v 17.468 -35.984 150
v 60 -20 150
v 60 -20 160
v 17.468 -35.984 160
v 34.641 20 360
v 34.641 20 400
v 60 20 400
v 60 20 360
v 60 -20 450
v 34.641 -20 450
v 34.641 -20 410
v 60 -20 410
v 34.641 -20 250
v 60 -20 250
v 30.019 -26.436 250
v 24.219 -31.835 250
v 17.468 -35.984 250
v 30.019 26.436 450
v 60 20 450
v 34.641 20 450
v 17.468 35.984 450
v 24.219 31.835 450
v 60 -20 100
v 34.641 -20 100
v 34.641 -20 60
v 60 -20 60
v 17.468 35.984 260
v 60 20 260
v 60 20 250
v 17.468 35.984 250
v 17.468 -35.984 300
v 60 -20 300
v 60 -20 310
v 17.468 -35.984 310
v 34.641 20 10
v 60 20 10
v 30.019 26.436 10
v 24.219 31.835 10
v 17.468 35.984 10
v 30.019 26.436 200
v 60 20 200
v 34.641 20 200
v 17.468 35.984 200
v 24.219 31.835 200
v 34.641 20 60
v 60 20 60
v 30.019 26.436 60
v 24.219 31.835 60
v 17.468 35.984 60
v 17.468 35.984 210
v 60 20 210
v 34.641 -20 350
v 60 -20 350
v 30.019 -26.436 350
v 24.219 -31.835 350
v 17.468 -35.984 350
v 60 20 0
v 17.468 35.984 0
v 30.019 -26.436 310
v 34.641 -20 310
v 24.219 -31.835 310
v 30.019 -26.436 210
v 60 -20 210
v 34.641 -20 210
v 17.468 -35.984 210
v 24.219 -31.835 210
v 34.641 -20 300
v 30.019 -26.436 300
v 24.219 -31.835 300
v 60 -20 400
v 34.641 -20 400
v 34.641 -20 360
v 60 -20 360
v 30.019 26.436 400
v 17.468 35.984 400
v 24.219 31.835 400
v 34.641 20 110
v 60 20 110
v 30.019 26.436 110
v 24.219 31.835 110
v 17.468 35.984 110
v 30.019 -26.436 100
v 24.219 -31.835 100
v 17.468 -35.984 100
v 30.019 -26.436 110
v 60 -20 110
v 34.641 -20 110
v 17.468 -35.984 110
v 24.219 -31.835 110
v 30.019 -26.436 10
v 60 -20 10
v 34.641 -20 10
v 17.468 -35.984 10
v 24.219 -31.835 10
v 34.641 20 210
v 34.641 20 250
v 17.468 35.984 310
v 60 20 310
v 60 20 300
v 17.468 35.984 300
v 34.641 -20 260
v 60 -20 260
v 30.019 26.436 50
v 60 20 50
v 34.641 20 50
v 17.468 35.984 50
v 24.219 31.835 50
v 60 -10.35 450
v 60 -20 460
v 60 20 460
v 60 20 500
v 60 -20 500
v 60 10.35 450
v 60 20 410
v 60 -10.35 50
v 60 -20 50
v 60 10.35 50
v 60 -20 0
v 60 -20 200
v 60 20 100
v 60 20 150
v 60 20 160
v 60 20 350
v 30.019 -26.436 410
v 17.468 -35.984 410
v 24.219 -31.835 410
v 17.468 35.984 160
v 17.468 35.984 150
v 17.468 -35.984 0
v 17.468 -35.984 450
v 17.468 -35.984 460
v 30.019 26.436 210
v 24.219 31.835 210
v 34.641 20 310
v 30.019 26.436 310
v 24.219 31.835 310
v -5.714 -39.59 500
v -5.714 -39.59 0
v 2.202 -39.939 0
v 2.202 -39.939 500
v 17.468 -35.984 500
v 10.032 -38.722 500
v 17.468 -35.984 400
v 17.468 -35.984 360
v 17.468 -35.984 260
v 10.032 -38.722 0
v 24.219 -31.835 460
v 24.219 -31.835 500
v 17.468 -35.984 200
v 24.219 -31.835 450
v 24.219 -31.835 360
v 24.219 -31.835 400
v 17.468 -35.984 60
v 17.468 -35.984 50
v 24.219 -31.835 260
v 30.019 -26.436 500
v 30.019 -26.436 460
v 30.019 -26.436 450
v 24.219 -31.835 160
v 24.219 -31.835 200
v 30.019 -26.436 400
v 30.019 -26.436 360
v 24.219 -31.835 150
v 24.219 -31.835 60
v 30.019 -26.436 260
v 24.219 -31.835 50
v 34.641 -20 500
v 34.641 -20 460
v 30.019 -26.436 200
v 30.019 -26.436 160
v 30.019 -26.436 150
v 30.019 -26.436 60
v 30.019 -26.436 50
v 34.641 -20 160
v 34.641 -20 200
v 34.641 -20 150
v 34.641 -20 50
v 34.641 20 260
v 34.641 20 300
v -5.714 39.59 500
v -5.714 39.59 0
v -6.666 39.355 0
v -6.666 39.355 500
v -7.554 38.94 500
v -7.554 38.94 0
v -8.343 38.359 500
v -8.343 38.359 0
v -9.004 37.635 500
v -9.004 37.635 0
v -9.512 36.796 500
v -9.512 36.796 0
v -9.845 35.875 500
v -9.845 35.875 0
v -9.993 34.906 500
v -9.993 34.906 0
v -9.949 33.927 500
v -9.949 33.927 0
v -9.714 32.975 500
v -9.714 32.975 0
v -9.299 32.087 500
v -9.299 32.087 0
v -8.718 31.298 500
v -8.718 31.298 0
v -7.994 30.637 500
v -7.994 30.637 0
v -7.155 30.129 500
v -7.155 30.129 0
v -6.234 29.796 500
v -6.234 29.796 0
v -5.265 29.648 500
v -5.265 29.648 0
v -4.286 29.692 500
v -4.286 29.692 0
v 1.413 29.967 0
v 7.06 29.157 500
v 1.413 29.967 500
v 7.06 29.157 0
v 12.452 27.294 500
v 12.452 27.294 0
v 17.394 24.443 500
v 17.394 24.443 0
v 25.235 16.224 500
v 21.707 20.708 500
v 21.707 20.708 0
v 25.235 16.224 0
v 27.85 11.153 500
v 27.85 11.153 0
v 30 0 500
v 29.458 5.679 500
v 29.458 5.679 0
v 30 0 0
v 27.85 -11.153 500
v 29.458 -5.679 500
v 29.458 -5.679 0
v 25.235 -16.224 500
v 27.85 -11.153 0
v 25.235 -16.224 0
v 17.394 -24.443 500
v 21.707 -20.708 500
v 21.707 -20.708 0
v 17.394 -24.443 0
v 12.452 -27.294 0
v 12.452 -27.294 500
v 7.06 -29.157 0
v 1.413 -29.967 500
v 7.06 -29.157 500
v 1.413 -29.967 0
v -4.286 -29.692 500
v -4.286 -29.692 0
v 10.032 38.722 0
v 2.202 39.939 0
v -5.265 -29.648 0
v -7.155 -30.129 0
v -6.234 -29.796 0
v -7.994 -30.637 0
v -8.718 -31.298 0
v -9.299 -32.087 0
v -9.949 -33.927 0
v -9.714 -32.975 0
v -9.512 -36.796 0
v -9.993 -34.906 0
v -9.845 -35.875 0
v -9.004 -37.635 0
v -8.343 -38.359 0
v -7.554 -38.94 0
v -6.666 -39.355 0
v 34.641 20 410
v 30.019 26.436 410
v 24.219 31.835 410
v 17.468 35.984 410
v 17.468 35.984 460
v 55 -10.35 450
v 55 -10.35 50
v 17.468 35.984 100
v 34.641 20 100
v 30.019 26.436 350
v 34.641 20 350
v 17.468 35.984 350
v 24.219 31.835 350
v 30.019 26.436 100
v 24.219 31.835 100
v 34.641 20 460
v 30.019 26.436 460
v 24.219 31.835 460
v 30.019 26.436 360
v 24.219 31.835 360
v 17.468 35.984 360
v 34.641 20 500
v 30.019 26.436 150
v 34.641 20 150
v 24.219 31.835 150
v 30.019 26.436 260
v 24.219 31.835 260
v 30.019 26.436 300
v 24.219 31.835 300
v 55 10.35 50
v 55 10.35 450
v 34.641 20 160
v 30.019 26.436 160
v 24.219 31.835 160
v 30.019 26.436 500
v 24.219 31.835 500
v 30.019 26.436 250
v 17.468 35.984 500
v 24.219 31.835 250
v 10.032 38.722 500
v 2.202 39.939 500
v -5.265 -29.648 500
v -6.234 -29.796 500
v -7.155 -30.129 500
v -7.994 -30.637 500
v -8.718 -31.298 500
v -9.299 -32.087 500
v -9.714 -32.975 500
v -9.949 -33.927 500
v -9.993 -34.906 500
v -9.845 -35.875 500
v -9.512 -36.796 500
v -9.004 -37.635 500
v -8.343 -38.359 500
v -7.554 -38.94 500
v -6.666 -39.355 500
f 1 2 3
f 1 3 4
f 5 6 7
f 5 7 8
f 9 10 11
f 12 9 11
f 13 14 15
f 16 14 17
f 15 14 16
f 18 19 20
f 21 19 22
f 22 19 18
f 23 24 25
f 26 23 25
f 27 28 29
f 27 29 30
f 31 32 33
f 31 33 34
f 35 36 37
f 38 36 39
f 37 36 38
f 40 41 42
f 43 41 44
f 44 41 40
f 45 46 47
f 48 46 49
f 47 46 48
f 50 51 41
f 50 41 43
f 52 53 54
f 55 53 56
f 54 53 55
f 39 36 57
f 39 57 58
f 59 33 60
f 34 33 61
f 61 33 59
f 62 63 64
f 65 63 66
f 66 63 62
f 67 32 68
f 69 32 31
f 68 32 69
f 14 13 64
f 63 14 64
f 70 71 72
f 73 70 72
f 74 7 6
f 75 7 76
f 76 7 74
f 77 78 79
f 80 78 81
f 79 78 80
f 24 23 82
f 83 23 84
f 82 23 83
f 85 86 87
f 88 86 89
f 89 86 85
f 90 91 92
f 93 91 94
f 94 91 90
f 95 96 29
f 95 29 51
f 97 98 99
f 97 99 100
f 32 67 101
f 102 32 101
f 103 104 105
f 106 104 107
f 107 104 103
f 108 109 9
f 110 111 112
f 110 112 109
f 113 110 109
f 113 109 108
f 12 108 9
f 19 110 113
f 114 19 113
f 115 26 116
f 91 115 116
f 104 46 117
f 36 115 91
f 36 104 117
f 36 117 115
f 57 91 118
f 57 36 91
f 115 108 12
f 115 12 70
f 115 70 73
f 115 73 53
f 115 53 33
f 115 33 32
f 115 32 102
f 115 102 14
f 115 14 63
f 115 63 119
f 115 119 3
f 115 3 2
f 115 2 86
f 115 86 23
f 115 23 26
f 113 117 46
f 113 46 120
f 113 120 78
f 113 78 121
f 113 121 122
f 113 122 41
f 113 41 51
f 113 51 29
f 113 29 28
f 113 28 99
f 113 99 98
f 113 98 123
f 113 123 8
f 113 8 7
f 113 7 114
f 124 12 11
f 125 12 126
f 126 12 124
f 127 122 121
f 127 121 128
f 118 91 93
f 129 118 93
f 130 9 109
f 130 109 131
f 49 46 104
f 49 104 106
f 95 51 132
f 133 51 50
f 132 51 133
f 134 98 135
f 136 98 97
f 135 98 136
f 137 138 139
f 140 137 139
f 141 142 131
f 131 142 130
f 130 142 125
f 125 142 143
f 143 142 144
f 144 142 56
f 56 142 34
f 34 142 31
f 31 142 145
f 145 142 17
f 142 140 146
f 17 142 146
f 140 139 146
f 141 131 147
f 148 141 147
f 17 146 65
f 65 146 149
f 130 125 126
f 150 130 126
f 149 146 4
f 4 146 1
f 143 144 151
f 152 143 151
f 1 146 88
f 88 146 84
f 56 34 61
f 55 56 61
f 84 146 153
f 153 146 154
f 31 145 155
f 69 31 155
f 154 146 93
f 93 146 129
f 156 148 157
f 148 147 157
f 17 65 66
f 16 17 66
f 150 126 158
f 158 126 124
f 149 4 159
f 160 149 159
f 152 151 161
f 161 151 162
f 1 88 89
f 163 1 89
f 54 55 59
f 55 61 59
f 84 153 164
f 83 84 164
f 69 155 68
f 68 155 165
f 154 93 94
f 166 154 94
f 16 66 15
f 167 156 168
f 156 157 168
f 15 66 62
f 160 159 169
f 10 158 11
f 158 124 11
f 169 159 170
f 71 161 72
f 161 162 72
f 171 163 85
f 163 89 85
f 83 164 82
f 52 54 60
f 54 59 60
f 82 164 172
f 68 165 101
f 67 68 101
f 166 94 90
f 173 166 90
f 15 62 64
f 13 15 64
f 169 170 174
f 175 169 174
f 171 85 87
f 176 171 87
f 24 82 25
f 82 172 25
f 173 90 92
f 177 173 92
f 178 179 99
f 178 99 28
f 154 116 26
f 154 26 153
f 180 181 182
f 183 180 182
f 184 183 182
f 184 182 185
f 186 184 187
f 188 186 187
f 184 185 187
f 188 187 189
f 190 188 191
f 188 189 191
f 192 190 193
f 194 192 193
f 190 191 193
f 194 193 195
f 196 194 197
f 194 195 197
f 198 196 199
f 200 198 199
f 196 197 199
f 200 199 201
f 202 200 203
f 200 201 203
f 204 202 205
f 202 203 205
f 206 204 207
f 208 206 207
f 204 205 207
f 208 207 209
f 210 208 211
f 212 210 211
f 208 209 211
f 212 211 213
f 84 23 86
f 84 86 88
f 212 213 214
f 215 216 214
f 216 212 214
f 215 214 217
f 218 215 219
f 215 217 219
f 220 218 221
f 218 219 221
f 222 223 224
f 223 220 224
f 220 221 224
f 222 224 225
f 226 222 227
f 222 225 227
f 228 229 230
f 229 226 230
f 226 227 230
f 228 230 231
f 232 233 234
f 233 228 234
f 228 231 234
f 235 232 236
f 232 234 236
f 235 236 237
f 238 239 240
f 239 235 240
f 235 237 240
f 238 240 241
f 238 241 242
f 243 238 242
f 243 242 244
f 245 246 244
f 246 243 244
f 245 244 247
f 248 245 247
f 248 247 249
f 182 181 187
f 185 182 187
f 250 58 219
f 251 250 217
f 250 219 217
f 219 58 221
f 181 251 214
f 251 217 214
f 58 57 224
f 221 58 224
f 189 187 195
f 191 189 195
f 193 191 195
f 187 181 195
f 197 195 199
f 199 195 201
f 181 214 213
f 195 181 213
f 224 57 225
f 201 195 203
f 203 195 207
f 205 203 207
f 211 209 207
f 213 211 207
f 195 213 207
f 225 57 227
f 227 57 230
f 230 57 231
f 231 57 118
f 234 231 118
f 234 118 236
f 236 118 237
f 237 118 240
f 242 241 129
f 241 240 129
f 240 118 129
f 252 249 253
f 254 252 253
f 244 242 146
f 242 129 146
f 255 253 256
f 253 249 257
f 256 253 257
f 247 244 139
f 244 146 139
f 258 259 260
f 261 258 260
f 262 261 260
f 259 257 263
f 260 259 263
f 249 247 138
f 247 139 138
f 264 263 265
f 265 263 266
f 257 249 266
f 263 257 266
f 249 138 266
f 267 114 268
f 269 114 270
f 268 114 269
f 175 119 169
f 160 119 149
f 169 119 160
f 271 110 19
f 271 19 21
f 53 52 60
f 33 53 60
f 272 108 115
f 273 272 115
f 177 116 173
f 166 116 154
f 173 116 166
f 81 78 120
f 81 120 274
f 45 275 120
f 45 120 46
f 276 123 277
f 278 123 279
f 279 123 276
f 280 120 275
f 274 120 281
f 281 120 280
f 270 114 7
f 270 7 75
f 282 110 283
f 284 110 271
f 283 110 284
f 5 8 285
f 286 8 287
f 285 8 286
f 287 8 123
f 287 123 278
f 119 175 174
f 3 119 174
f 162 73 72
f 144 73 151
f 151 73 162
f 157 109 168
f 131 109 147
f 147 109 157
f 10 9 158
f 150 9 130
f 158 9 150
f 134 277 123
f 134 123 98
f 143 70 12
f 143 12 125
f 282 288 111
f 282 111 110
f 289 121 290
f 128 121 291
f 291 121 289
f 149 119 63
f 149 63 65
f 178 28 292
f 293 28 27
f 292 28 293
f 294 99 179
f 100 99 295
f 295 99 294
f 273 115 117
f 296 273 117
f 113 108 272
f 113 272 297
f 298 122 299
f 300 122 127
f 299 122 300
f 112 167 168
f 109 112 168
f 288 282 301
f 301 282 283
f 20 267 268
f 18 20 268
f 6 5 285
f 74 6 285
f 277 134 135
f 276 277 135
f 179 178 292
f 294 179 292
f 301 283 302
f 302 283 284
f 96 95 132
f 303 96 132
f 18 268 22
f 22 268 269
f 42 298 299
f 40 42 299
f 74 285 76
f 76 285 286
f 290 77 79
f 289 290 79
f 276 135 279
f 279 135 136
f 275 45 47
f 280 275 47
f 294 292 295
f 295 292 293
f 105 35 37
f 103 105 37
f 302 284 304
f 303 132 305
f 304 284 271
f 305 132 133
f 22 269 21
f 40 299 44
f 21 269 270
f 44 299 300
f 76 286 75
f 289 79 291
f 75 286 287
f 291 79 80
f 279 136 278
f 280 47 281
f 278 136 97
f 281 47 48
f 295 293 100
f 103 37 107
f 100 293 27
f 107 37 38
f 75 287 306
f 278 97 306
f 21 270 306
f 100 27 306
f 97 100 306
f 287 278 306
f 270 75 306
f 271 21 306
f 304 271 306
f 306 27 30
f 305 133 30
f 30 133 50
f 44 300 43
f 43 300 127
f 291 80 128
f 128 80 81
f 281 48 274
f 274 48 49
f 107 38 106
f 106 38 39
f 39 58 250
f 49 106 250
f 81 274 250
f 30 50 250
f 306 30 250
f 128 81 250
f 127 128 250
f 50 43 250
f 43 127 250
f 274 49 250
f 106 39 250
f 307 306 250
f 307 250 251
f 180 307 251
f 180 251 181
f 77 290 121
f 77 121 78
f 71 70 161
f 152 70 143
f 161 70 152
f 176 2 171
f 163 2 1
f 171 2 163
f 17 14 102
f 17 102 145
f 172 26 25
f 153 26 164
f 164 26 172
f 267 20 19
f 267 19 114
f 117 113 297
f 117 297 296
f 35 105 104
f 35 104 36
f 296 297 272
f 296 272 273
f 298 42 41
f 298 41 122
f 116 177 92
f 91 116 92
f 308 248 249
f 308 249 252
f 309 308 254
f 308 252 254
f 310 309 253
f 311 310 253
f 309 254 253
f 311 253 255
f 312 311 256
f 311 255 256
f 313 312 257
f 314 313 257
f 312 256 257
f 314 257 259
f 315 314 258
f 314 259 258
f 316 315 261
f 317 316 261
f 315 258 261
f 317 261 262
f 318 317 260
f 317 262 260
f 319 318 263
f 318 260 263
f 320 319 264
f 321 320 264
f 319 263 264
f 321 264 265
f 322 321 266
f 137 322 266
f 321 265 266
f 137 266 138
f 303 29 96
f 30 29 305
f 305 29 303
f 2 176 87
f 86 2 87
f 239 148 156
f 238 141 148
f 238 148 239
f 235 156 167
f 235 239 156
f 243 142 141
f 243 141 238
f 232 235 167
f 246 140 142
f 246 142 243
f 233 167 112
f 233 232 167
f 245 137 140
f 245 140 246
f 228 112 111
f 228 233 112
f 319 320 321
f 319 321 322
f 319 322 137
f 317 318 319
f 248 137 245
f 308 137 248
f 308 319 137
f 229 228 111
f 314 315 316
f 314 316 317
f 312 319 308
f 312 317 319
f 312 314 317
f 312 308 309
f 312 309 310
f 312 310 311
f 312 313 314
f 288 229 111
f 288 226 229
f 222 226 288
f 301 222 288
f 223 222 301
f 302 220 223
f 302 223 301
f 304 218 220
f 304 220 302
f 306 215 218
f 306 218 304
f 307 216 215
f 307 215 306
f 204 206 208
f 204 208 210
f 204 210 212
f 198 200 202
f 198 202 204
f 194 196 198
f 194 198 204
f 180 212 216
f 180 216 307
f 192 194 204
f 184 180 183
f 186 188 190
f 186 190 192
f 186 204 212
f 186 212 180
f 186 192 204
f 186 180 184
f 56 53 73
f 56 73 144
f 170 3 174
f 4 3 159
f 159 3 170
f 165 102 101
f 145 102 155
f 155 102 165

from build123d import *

# Parameters (mm, degrees)
BOSS_EXTRUDE1_DEPTH     = 500
BOSS_EXTRUDE2_START     = 30
SKETCH2_W               = 500
SKETCH2_H               = 40
BOSS_EXTRUDE2_DEPTH     = 30
RIB1_REACH              = 507.173
SKETCH4_WALL_W          = 1057.782982674
SKETCH4_WALL_H          = 10
LPATTERN1_COUNT         = 10
LPATTERN1_PITCH         = 50
MIRROR1_COPY_1_REACH    = 507.173
MIRROR1_COPY_1_SKETCH_W = 1057.782982674
MIRROR1_COPY_1_SKETCH_H = 10
MIRROR1_COPY_2_REACH    = 507.173
MIRROR1_COPY_2_SKETCH_W = 1057.782982674
MIRROR1_COPY_2_SKETCH_H = 10
MIRROR1_COPY_3_REACH    = 507.173
MIRROR1_COPY_3_SKETCH_W = 1057.782982674
MIRROR1_COPY_3_SKETCH_H = 10
MIRROR1_COPY_4_REACH    = 507.173
MIRROR1_COPY_4_SKETCH_W = 1057.782982674
MIRROR1_COPY_4_SKETCH_H = 10
MIRROR1_COPY_5_REACH    = 507.173
MIRROR1_COPY_5_SKETCH_W = 1057.782982674
MIRROR1_COPY_5_SKETCH_H = 10
MIRROR1_COPY_6_REACH    = 507.173
MIRROR1_COPY_6_SKETCH_W = 1057.782982674
MIRROR1_COPY_6_SKETCH_H = 10
MIRROR1_COPY_7_REACH    = 507.173
MIRROR1_COPY_7_SKETCH_W = 1057.782982674
MIRROR1_COPY_7_SKETCH_H = 10
MIRROR1_COPY_8_REACH    = 507.173
MIRROR1_COPY_8_SKETCH_W = 1057.782982674
MIRROR1_COPY_8_SKETCH_H = 10
MIRROR1_COPY_9_REACH    = 507.173
MIRROR1_COPY_9_SKETCH_W = 1057.782982674
MIRROR1_COPY_9_SKETCH_H = 10
SKETCH5_W               = 400
SKETCH5_H               = 20.700317686
CUT_EXTRUDE1_DEPTH      = 5


with BuildPart() as part:
    # Sketch1 → Boss-Extrude1 (new body)
    with BuildSketch(Plane.XY):
        with BuildLine():
            ThreePointArc((-5.714285714, 39.589732744), (-9.948716593, 33.926730437), (-4.285714286, 29.692299558))
            ThreePointArc((-4.285714286, 29.692299558), (30, 0), (-4.285714286, -29.692299558))
            ThreePointArc((-4.285714286, -29.692299558), (-9.948716593, -33.926730437), (-5.714285714, -39.589732744))
            ThreePointArc((-5.714285714, -39.589732744), (40, 0), (-5.714285714, 39.589732744))
        make_face()
    extrude(amount=BOSS_EXTRUDE1_DEPTH)

    # Sketch2 → Boss-Extrude2 (add)
    with BuildSketch(Plane(origin=(0, 0, 0), x_dir=(0, 0, -1), z_dir=(1, 0, 0)).offset(BOSS_EXTRUDE2_START)):
        with Locations((-250, 0)):
            Rectangle(SKETCH2_W, SKETCH2_H)
    extrude(amount=BOSS_EXTRUDE2_DEPTH)

    # Sketch4 wall → Rib1 (add, up to next)
    with BuildSketch(Plane(origin=(38.733961597, 27.992162595, 0), x_dir=(-0.936077158958, 0.351794759025, 0), z_dir=(0.351794759025, 0.936077158958, 0)), mode=Mode.PRIVATE) as rib1_sk1:
        with Locations((0, 5)):
            Rectangle(SKETCH4_WALL_W, SKETCH4_WALL_H)
    rib1_tool1 = extrude(rib1_sk1.sketch, amount=-RIB1_REACH, mode=Mode.PRIVATE) - part.part
    rib1 = rib1_tool1.solids().sort_by_distance((38.733961597, 27.992162595, 0))[0]
    add(rib1)

    # LPattern1: Rib1 ×10
    with Locations(*[(0, 0, i * LPATTERN1_PITCH) for i in range(1, LPATTERN1_COUNT)]):
        add(rib1)

    # Mirror1: Rib1 across plane
    add(rib1.mirror(Plane.ZX))

    # Mirror1 copy 1 sketch → Mirror1 copy 1 (add, up to next)
    with BuildSketch(Plane(origin=(38.733961597, -27.992162595, 50), x_dir=(-0.936077158958, -0.351794759025, 0), z_dir=(0.351794759025, -0.936077158958, 0)), mode=Mode.PRIVATE) as mirror1_copy_1_sk1:
        with Locations((0, -5)):
            Rectangle(MIRROR1_COPY_1_SKETCH_W, MIRROR1_COPY_1_SKETCH_H)
    mirror1_copy_1_tool1 = extrude(mirror1_copy_1_sk1.sketch, amount=-MIRROR1_COPY_1_REACH, mode=Mode.PRIVATE) - part.part
    add(mirror1_copy_1_tool1.solids().sort_by_distance((38.733961597, -27.992162595, 50))[0])

    # Mirror1 copy 2 sketch → Mirror1 copy 2 (add, up to next)
    with BuildSketch(Plane(origin=(38.733961597, -27.992162595, 100), x_dir=(-0.936077158958, -0.351794759025, 0), z_dir=(0.351794759025, -0.936077158958, 0)), mode=Mode.PRIVATE) as mirror1_copy_2_sk1:
        with Locations((0, -5)):
            Rectangle(MIRROR1_COPY_2_SKETCH_W, MIRROR1_COPY_2_SKETCH_H)
    mirror1_copy_2_tool1 = extrude(mirror1_copy_2_sk1.sketch, amount=-MIRROR1_COPY_2_REACH, mode=Mode.PRIVATE) - part.part
    add(mirror1_copy_2_tool1.solids().sort_by_distance((38.733961597, -27.992162595, 100))[0])

    # Mirror1 copy 3 sketch → Mirror1 copy 3 (add, up to next)
    with BuildSketch(Plane(origin=(38.733961597, -27.992162595, 150), x_dir=(-0.936077158958, -0.351794759025, 0), z_dir=(0.351794759025, -0.936077158958, 0)), mode=Mode.PRIVATE) as mirror1_copy_3_sk1:
        with Locations((0, -5)):
            Rectangle(MIRROR1_COPY_3_SKETCH_W, MIRROR1_COPY_3_SKETCH_H)
    mirror1_copy_3_tool1 = extrude(mirror1_copy_3_sk1.sketch, amount=-MIRROR1_COPY_3_REACH, mode=Mode.PRIVATE) - part.part
    add(mirror1_copy_3_tool1.solids().sort_by_distance((38.733961597, -27.992162595, 150))[0])

    # Mirror1 copy 4 sketch → Mirror1 copy 4 (add, up to next)
    with BuildSketch(Plane(origin=(38.733961597, -27.992162595, 200), x_dir=(-0.936077158958, -0.351794759025, 0), z_dir=(0.351794759025, -0.936077158958, 0)), mode=Mode.PRIVATE) as mirror1_copy_4_sk1:
        with Locations((0, -5)):
            Rectangle(MIRROR1_COPY_4_SKETCH_W, MIRROR1_COPY_4_SKETCH_H)
    mirror1_copy_4_tool1 = extrude(mirror1_copy_4_sk1.sketch, amount=-MIRROR1_COPY_4_REACH, mode=Mode.PRIVATE) - part.part
    add(mirror1_copy_4_tool1.solids().sort_by_distance((38.733961597, -27.992162595, 200))[0])

    # Mirror1 copy 5 sketch → Mirror1 copy 5 (add, up to next)
    with BuildSketch(Plane(origin=(38.733961597, -27.992162595, 250), x_dir=(-0.936077158958, -0.351794759025, 0), z_dir=(0.351794759025, -0.936077158958, 0)), mode=Mode.PRIVATE) as mirror1_copy_5_sk1:
        with Locations((0, -5)):
            Rectangle(MIRROR1_COPY_5_SKETCH_W, MIRROR1_COPY_5_SKETCH_H)
    mirror1_copy_5_tool1 = extrude(mirror1_copy_5_sk1.sketch, amount=-MIRROR1_COPY_5_REACH, mode=Mode.PRIVATE) - part.part
    add(mirror1_copy_5_tool1.solids().sort_by_distance((38.733961597, -27.992162595, 250))[0])

    # Mirror1 copy 6 sketch → Mirror1 copy 6 (add, up to next)
    with BuildSketch(Plane(origin=(38.733961597, -27.992162595, 300), x_dir=(-0.936077158958, -0.351794759025, 0), z_dir=(0.351794759025, -0.936077158958, 0)), mode=Mode.PRIVATE) as mirror1_copy_6_sk1:
        with Locations((0, -5)):
            Rectangle(MIRROR1_COPY_6_SKETCH_W, MIRROR1_COPY_6_SKETCH_H)
    mirror1_copy_6_tool1 = extrude(mirror1_copy_6_sk1.sketch, amount=-MIRROR1_COPY_6_REACH, mode=Mode.PRIVATE) - part.part
    add(mirror1_copy_6_tool1.solids().sort_by_distance((38.733961597, -27.992162595, 300))[0])

    # Mirror1 copy 7 sketch → Mirror1 copy 7 (add, up to next)
    with BuildSketch(Plane(origin=(38.733961597, -27.992162595, 350), x_dir=(-0.936077158958, -0.351794759025, 0), z_dir=(0.351794759025, -0.936077158958, 0)), mode=Mode.PRIVATE) as mirror1_copy_7_sk1:
        with Locations((0, -5)):
            Rectangle(MIRROR1_COPY_7_SKETCH_W, MIRROR1_COPY_7_SKETCH_H)
    mirror1_copy_7_tool1 = extrude(mirror1_copy_7_sk1.sketch, amount=-MIRROR1_COPY_7_REACH, mode=Mode.PRIVATE) - part.part
    add(mirror1_copy_7_tool1.solids().sort_by_distance((38.733961597, -27.992162595, 350))[0])

    # Mirror1 copy 8 sketch → Mirror1 copy 8 (add, up to next)
    with BuildSketch(Plane(origin=(38.733961597, -27.992162595, 400), x_dir=(-0.936077158958, -0.351794759025, 0), z_dir=(0.351794759025, -0.936077158958, 0)), mode=Mode.PRIVATE) as mirror1_copy_8_sk1:
        with Locations((0, -5)):
            Rectangle(MIRROR1_COPY_8_SKETCH_W, MIRROR1_COPY_8_SKETCH_H)
    mirror1_copy_8_tool1 = extrude(mirror1_copy_8_sk1.sketch, amount=-MIRROR1_COPY_8_REACH, mode=Mode.PRIVATE) - part.part
    add(mirror1_copy_8_tool1.solids().sort_by_distance((38.733961597, -27.992162595, 400))[0])

    # Mirror1 copy 9 sketch → Mirror1 copy 9 (add, up to next)
    with BuildSketch(Plane(origin=(38.733961597, -27.992162595, 450), x_dir=(-0.936077158958, -0.351794759025, 0), z_dir=(0.351794759025, -0.936077158958, 0)), mode=Mode.PRIVATE) as mirror1_copy_9_sk1:
        with Locations((0, -5)):
            Rectangle(MIRROR1_COPY_9_SKETCH_W, MIRROR1_COPY_9_SKETCH_H)
    mirror1_copy_9_tool1 = extrude(mirror1_copy_9_sk1.sketch, amount=-MIRROR1_COPY_9_REACH, mode=Mode.PRIVATE) - part.part
    add(mirror1_copy_9_tool1.solids().sort_by_distance((38.733961597, -27.992162595, 450))[0])

    # Sketch5 → Cut-Extrude1 (cut)
    with BuildSketch(Plane(origin=(60, 0, 0), x_dir=(0, 0, -1), z_dir=(1, 0, 0))):
        with Locations((-250, 0)):
            Rectangle(SKETCH5_W, SKETCH5_H)
    extrude(amount=-CUT_EXTRUDE1_DEPTH, mode=Mode.SUBTRACT)


solid = part.part
